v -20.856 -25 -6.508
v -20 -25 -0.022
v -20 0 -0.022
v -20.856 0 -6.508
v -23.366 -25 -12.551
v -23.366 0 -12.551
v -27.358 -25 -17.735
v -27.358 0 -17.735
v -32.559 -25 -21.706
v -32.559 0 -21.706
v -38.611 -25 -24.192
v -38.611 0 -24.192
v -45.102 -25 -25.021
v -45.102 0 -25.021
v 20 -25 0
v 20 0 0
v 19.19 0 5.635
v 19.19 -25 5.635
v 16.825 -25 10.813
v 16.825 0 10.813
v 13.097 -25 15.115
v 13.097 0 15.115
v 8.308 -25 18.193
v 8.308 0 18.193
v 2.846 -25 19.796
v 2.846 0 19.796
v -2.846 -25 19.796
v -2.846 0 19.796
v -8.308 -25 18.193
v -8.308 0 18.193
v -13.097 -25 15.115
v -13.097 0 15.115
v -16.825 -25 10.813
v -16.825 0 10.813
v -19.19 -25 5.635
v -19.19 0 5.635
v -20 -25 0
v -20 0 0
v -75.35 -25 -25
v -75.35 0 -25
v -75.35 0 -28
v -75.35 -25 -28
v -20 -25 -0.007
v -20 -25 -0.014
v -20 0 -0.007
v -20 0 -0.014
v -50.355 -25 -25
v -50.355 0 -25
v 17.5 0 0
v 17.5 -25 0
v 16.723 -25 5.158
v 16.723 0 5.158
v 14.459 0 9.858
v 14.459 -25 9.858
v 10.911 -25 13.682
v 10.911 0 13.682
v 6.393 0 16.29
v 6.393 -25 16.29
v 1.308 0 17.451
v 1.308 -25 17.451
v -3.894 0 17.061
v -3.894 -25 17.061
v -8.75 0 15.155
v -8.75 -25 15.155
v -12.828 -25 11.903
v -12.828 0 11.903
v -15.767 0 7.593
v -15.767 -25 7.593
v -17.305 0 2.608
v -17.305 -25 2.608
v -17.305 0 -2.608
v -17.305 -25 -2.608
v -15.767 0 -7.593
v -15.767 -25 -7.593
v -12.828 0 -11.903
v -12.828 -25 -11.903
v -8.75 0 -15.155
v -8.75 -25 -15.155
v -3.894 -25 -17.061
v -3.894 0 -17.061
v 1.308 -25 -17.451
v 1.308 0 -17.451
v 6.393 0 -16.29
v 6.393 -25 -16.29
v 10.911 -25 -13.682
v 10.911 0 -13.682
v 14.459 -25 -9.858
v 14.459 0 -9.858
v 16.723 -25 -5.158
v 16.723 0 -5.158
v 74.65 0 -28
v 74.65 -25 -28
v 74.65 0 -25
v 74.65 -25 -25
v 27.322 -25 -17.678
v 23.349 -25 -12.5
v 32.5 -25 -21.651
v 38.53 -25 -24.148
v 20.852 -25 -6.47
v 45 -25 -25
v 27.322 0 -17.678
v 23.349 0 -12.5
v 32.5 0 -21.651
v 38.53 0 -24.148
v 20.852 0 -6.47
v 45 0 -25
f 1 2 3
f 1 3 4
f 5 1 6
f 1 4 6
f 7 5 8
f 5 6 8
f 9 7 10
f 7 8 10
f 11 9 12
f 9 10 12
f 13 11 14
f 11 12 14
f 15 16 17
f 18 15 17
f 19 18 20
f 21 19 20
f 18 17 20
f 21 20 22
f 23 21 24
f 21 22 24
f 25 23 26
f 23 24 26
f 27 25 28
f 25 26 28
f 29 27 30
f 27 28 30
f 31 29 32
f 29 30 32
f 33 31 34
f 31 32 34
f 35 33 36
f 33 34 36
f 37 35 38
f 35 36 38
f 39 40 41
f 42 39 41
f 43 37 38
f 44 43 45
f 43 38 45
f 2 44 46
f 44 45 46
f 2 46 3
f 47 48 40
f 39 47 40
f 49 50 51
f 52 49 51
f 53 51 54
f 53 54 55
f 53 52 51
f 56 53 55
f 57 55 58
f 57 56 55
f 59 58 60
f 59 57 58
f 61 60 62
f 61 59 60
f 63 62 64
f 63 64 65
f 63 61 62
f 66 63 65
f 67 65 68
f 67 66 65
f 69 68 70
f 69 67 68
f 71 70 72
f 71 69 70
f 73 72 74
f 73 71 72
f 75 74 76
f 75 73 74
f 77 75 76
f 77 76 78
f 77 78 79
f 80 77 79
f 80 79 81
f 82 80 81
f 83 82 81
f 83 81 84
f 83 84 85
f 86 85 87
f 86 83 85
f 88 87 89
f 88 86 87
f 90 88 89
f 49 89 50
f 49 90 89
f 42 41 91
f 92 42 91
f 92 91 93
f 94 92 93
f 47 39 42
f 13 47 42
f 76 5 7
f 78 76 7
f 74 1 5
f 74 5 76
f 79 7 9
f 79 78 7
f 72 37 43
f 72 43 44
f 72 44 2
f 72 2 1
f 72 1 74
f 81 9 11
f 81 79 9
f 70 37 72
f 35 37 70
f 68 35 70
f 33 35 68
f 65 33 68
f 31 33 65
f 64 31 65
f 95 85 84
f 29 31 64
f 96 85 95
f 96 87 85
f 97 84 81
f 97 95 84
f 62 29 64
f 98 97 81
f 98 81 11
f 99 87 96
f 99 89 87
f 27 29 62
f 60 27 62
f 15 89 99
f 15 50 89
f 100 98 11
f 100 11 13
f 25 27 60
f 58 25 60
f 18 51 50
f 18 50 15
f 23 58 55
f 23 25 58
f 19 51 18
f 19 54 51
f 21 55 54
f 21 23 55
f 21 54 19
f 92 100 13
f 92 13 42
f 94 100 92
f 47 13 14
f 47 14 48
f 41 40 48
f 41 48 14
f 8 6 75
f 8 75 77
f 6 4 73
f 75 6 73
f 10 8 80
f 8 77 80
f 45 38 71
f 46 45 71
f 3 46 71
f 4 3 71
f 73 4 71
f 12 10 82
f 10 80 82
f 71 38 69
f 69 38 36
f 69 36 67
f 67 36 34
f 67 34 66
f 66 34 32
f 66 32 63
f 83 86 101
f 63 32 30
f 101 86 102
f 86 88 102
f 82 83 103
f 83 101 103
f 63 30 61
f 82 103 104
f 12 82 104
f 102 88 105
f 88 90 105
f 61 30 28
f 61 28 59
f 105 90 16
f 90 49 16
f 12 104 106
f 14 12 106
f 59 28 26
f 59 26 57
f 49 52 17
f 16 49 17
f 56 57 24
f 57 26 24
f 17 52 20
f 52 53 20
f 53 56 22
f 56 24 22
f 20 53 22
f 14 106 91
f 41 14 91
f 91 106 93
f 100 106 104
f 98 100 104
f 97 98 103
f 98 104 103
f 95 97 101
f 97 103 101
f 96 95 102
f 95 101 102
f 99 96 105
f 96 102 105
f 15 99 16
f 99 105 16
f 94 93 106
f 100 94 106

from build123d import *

# Parameters (mm, degrees)
F0_R     = 17.5
F1_DEPTH = 25


# Not quite as in the source:
# - ends of sketch curves that miss each other by under 0.0002 mm in the source are joined


with BuildPart() as f1:
    # F0 (on Front) → F1 (new body)
    with BuildSketch(Plane.XZ):
        with BuildLine():
            ThreePointArc((45, -25), (27.3223304703, -17.6776695297), (20, 0))
            ThreePointArc((20, 0), (0.0107860663, -19.9999970915), (-19.9999883661, -0.0215721294))
            ThreePointArc((-19.9999883661, -0.0215721294), (-27.3583172251, -17.7351553161), (-45.1016823096, -25.0213653552))
            Line((-45.1016823096, -25.0213653552), (-50.3546064898, -25))
            Line((-50.3546064898, -25), (-75.3500018494, -25))
            Line((-75.3500018494, -25), (-75.3500018494, -28))
            Line((-75.3500018494, -28), (74.6500011308, -28))
            Line((74.6500011308, -28), (74.65, -25))
            Line((74.65, -25), (50.3546064898, -25))
            Line((50.3546064898, -25), (45, -25))
        make_face()
        with BuildLine():
            ThreePointArc((-19.9999883661, -0.0215721294), (0.0107860663, -19.9999970915), (20, 0))
            ThreePointArc((20, 0), (0, 20), (-20, 0))
            ThreePointArc((-20, 0), (-19.9999970915, -0.0107860663), (-19.9999883661, -0.0215721294))
        make_face()
        Circle(F0_R, mode=Mode.SUBTRACT)
    extrude(amount=F1_DEPTH)


solid = f1.part
